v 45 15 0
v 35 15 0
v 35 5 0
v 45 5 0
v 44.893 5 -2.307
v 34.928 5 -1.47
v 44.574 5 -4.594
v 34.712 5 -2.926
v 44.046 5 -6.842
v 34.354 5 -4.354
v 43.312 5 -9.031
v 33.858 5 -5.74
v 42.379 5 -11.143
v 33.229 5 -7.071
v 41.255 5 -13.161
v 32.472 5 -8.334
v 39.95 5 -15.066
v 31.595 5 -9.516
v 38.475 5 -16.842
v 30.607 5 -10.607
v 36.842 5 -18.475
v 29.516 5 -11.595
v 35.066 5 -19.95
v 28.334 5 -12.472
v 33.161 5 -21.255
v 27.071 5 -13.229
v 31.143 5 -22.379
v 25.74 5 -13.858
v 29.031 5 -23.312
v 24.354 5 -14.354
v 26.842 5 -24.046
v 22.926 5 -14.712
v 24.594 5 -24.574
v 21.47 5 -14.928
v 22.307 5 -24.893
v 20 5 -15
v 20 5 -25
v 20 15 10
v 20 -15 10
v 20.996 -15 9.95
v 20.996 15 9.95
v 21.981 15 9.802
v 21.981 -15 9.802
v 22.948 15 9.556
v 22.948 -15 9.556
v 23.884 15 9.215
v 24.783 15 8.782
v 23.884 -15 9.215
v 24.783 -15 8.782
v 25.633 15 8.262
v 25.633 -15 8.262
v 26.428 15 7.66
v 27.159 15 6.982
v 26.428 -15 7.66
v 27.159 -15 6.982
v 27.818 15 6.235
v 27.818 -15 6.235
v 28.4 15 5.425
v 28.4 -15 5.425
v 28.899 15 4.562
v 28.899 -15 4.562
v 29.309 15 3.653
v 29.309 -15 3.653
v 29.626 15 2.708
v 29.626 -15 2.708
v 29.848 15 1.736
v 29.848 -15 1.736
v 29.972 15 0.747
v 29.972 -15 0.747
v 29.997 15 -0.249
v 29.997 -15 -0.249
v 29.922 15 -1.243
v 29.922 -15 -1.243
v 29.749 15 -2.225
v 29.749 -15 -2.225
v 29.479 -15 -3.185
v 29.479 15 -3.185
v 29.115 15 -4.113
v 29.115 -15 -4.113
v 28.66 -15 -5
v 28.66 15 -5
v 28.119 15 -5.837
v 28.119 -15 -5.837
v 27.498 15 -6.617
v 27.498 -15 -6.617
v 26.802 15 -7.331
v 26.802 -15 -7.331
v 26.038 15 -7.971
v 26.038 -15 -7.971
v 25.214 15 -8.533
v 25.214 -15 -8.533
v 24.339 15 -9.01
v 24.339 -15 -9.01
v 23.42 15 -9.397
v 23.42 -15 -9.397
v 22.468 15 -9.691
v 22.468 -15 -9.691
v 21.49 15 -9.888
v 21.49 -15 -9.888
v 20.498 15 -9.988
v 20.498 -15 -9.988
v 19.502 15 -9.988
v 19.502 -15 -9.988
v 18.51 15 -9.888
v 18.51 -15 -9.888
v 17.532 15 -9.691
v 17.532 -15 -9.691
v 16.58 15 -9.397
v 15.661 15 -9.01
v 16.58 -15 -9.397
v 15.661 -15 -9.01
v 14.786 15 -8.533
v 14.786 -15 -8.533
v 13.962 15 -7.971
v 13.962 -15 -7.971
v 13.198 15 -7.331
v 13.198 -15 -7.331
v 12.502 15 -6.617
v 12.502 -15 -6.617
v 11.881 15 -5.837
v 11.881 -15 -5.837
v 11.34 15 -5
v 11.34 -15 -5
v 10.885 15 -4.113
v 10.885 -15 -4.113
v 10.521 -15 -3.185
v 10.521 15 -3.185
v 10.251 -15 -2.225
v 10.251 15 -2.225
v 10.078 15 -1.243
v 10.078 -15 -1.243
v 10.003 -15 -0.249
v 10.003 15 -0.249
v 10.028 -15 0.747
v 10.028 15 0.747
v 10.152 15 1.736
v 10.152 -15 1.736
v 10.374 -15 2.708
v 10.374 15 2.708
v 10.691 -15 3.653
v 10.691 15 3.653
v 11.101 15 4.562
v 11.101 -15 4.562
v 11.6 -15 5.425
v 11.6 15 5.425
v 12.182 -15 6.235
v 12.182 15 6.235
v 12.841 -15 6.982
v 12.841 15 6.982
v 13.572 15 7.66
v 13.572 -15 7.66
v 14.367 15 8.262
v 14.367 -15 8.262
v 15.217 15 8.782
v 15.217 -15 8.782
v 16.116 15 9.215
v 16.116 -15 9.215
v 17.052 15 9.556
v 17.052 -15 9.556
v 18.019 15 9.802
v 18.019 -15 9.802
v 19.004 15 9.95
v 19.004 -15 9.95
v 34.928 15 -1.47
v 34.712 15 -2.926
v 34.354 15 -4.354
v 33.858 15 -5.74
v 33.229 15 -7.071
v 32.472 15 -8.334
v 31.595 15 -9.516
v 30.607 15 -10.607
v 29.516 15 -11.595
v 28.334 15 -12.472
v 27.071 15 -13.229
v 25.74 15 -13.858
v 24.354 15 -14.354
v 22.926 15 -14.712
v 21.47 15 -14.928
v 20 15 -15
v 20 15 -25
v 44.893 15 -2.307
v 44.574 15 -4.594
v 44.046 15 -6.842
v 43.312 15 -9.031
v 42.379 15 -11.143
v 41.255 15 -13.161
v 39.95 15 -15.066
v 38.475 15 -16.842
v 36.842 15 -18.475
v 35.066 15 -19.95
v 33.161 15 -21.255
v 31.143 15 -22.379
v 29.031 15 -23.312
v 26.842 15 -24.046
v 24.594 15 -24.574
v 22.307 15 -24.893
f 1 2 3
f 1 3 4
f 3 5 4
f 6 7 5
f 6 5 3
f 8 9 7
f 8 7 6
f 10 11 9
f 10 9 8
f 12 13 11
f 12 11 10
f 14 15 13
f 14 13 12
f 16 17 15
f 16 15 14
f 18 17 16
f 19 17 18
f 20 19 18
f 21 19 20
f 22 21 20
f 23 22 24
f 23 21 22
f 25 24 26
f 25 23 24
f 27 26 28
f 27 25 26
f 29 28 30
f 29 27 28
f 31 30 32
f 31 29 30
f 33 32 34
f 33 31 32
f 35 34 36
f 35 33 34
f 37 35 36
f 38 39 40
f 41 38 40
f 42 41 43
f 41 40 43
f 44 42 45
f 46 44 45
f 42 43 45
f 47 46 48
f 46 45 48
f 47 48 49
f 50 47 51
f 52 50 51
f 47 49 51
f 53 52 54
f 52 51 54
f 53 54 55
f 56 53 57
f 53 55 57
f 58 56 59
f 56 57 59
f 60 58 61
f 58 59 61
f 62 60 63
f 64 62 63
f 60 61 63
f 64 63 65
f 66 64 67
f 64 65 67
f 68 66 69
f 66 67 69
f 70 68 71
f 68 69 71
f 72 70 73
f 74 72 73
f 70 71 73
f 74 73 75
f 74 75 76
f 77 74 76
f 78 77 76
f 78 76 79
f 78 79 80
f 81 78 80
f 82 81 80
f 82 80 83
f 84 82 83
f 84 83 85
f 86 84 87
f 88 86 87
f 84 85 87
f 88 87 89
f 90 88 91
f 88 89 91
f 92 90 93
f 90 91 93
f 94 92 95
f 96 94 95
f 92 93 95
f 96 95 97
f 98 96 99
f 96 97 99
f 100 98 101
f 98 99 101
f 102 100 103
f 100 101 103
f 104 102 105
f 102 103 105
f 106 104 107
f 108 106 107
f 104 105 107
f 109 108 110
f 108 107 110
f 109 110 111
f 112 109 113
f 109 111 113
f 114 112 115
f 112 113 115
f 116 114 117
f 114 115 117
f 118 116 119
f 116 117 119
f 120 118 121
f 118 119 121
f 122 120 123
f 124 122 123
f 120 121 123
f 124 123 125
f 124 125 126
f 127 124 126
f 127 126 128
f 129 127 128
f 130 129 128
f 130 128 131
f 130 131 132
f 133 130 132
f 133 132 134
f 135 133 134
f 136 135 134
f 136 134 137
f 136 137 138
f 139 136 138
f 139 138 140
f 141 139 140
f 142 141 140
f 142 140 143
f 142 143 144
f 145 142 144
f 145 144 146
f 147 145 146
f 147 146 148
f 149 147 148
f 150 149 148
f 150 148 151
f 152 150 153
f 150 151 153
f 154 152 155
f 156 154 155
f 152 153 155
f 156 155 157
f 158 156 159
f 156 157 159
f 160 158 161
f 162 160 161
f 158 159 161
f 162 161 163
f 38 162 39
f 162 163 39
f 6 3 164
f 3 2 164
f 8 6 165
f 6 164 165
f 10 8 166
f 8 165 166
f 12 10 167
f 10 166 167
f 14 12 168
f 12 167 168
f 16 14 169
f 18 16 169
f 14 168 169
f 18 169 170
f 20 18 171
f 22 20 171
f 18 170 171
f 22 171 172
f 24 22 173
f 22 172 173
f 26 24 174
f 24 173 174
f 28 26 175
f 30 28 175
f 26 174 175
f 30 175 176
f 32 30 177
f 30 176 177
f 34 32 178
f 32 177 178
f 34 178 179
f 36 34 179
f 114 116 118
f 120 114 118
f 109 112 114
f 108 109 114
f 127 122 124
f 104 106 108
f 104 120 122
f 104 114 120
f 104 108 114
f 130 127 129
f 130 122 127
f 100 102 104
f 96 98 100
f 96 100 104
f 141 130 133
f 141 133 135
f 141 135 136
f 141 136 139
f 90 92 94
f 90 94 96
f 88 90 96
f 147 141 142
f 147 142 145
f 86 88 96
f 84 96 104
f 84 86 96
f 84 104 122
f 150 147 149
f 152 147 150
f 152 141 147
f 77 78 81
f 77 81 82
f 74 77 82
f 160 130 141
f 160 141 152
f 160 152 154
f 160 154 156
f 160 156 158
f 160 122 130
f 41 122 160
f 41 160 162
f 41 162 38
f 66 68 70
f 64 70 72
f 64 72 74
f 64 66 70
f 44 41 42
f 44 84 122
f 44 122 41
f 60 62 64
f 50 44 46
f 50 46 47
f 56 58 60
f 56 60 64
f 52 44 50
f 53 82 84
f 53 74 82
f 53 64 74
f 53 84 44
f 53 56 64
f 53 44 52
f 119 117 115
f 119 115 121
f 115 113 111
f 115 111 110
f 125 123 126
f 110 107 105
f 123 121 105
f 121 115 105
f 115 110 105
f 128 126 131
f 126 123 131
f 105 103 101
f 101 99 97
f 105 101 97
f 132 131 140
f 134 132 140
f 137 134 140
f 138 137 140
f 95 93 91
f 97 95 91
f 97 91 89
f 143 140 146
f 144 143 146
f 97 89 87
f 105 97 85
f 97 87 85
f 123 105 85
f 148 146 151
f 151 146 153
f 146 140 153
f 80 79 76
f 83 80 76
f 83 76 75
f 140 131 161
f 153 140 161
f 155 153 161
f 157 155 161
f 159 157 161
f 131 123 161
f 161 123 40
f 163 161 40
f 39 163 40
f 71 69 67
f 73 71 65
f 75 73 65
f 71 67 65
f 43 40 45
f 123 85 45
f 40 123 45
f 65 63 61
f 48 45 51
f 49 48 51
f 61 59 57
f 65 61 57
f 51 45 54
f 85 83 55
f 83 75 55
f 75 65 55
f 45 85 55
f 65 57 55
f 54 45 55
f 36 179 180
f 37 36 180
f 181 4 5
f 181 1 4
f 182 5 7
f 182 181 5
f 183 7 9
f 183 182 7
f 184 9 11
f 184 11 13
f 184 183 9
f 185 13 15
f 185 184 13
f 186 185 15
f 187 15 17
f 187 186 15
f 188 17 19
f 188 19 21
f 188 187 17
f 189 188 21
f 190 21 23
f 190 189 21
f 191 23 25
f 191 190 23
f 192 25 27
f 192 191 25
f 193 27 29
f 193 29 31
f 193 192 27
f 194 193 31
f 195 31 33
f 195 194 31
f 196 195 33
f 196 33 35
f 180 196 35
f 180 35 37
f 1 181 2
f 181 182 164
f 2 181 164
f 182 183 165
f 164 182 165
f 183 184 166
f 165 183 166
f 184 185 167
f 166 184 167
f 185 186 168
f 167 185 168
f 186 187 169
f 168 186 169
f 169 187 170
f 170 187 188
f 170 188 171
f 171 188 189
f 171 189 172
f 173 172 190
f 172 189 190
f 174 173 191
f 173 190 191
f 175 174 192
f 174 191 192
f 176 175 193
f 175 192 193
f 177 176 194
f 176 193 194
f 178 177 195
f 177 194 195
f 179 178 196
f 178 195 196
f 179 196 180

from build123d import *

# Parameters (mm, degrees)
BOSS_EXTRUDE1_DEPTH      = 15
BOSS_EXTRUDE1_DEPTH_BACK = 15
SKETCH1_R                = 10
SKETCH2_W                = 10
SKETCH2_H                = 10
REVOLVE1_ANGLE           = 90


with BuildPart() as part:
    # Sketch1 → Boss-Extrude1 (new, two sides: drawn at the far end of the back side and taken through both)
    with BuildSketch(Plane(origin=(0, 0, 0), x_dir=(1, 0, 0), z_dir=(0, 1, 0)).offset(-BOSS_EXTRUDE1_DEPTH_BACK)):
        with Locations((20, 0)):
            Circle(SKETCH1_R)
    extrude(amount=BOSS_EXTRUDE1_DEPTH + BOSS_EXTRUDE1_DEPTH_BACK)


with BuildPart() as body_2:
    # Sketch2 → Revolve1 (revolve)
    with BuildSketch(Plane.XY):
        with Locations((40, 10)):
            Rectangle(SKETCH2_W, SKETCH2_H)
    revolve(axis=Axis((20, -15, 0), (0, 1, 0)), revolution_arc=REVOLVE1_ANGLE)


solid = Compound([part.part, body_2.part])
